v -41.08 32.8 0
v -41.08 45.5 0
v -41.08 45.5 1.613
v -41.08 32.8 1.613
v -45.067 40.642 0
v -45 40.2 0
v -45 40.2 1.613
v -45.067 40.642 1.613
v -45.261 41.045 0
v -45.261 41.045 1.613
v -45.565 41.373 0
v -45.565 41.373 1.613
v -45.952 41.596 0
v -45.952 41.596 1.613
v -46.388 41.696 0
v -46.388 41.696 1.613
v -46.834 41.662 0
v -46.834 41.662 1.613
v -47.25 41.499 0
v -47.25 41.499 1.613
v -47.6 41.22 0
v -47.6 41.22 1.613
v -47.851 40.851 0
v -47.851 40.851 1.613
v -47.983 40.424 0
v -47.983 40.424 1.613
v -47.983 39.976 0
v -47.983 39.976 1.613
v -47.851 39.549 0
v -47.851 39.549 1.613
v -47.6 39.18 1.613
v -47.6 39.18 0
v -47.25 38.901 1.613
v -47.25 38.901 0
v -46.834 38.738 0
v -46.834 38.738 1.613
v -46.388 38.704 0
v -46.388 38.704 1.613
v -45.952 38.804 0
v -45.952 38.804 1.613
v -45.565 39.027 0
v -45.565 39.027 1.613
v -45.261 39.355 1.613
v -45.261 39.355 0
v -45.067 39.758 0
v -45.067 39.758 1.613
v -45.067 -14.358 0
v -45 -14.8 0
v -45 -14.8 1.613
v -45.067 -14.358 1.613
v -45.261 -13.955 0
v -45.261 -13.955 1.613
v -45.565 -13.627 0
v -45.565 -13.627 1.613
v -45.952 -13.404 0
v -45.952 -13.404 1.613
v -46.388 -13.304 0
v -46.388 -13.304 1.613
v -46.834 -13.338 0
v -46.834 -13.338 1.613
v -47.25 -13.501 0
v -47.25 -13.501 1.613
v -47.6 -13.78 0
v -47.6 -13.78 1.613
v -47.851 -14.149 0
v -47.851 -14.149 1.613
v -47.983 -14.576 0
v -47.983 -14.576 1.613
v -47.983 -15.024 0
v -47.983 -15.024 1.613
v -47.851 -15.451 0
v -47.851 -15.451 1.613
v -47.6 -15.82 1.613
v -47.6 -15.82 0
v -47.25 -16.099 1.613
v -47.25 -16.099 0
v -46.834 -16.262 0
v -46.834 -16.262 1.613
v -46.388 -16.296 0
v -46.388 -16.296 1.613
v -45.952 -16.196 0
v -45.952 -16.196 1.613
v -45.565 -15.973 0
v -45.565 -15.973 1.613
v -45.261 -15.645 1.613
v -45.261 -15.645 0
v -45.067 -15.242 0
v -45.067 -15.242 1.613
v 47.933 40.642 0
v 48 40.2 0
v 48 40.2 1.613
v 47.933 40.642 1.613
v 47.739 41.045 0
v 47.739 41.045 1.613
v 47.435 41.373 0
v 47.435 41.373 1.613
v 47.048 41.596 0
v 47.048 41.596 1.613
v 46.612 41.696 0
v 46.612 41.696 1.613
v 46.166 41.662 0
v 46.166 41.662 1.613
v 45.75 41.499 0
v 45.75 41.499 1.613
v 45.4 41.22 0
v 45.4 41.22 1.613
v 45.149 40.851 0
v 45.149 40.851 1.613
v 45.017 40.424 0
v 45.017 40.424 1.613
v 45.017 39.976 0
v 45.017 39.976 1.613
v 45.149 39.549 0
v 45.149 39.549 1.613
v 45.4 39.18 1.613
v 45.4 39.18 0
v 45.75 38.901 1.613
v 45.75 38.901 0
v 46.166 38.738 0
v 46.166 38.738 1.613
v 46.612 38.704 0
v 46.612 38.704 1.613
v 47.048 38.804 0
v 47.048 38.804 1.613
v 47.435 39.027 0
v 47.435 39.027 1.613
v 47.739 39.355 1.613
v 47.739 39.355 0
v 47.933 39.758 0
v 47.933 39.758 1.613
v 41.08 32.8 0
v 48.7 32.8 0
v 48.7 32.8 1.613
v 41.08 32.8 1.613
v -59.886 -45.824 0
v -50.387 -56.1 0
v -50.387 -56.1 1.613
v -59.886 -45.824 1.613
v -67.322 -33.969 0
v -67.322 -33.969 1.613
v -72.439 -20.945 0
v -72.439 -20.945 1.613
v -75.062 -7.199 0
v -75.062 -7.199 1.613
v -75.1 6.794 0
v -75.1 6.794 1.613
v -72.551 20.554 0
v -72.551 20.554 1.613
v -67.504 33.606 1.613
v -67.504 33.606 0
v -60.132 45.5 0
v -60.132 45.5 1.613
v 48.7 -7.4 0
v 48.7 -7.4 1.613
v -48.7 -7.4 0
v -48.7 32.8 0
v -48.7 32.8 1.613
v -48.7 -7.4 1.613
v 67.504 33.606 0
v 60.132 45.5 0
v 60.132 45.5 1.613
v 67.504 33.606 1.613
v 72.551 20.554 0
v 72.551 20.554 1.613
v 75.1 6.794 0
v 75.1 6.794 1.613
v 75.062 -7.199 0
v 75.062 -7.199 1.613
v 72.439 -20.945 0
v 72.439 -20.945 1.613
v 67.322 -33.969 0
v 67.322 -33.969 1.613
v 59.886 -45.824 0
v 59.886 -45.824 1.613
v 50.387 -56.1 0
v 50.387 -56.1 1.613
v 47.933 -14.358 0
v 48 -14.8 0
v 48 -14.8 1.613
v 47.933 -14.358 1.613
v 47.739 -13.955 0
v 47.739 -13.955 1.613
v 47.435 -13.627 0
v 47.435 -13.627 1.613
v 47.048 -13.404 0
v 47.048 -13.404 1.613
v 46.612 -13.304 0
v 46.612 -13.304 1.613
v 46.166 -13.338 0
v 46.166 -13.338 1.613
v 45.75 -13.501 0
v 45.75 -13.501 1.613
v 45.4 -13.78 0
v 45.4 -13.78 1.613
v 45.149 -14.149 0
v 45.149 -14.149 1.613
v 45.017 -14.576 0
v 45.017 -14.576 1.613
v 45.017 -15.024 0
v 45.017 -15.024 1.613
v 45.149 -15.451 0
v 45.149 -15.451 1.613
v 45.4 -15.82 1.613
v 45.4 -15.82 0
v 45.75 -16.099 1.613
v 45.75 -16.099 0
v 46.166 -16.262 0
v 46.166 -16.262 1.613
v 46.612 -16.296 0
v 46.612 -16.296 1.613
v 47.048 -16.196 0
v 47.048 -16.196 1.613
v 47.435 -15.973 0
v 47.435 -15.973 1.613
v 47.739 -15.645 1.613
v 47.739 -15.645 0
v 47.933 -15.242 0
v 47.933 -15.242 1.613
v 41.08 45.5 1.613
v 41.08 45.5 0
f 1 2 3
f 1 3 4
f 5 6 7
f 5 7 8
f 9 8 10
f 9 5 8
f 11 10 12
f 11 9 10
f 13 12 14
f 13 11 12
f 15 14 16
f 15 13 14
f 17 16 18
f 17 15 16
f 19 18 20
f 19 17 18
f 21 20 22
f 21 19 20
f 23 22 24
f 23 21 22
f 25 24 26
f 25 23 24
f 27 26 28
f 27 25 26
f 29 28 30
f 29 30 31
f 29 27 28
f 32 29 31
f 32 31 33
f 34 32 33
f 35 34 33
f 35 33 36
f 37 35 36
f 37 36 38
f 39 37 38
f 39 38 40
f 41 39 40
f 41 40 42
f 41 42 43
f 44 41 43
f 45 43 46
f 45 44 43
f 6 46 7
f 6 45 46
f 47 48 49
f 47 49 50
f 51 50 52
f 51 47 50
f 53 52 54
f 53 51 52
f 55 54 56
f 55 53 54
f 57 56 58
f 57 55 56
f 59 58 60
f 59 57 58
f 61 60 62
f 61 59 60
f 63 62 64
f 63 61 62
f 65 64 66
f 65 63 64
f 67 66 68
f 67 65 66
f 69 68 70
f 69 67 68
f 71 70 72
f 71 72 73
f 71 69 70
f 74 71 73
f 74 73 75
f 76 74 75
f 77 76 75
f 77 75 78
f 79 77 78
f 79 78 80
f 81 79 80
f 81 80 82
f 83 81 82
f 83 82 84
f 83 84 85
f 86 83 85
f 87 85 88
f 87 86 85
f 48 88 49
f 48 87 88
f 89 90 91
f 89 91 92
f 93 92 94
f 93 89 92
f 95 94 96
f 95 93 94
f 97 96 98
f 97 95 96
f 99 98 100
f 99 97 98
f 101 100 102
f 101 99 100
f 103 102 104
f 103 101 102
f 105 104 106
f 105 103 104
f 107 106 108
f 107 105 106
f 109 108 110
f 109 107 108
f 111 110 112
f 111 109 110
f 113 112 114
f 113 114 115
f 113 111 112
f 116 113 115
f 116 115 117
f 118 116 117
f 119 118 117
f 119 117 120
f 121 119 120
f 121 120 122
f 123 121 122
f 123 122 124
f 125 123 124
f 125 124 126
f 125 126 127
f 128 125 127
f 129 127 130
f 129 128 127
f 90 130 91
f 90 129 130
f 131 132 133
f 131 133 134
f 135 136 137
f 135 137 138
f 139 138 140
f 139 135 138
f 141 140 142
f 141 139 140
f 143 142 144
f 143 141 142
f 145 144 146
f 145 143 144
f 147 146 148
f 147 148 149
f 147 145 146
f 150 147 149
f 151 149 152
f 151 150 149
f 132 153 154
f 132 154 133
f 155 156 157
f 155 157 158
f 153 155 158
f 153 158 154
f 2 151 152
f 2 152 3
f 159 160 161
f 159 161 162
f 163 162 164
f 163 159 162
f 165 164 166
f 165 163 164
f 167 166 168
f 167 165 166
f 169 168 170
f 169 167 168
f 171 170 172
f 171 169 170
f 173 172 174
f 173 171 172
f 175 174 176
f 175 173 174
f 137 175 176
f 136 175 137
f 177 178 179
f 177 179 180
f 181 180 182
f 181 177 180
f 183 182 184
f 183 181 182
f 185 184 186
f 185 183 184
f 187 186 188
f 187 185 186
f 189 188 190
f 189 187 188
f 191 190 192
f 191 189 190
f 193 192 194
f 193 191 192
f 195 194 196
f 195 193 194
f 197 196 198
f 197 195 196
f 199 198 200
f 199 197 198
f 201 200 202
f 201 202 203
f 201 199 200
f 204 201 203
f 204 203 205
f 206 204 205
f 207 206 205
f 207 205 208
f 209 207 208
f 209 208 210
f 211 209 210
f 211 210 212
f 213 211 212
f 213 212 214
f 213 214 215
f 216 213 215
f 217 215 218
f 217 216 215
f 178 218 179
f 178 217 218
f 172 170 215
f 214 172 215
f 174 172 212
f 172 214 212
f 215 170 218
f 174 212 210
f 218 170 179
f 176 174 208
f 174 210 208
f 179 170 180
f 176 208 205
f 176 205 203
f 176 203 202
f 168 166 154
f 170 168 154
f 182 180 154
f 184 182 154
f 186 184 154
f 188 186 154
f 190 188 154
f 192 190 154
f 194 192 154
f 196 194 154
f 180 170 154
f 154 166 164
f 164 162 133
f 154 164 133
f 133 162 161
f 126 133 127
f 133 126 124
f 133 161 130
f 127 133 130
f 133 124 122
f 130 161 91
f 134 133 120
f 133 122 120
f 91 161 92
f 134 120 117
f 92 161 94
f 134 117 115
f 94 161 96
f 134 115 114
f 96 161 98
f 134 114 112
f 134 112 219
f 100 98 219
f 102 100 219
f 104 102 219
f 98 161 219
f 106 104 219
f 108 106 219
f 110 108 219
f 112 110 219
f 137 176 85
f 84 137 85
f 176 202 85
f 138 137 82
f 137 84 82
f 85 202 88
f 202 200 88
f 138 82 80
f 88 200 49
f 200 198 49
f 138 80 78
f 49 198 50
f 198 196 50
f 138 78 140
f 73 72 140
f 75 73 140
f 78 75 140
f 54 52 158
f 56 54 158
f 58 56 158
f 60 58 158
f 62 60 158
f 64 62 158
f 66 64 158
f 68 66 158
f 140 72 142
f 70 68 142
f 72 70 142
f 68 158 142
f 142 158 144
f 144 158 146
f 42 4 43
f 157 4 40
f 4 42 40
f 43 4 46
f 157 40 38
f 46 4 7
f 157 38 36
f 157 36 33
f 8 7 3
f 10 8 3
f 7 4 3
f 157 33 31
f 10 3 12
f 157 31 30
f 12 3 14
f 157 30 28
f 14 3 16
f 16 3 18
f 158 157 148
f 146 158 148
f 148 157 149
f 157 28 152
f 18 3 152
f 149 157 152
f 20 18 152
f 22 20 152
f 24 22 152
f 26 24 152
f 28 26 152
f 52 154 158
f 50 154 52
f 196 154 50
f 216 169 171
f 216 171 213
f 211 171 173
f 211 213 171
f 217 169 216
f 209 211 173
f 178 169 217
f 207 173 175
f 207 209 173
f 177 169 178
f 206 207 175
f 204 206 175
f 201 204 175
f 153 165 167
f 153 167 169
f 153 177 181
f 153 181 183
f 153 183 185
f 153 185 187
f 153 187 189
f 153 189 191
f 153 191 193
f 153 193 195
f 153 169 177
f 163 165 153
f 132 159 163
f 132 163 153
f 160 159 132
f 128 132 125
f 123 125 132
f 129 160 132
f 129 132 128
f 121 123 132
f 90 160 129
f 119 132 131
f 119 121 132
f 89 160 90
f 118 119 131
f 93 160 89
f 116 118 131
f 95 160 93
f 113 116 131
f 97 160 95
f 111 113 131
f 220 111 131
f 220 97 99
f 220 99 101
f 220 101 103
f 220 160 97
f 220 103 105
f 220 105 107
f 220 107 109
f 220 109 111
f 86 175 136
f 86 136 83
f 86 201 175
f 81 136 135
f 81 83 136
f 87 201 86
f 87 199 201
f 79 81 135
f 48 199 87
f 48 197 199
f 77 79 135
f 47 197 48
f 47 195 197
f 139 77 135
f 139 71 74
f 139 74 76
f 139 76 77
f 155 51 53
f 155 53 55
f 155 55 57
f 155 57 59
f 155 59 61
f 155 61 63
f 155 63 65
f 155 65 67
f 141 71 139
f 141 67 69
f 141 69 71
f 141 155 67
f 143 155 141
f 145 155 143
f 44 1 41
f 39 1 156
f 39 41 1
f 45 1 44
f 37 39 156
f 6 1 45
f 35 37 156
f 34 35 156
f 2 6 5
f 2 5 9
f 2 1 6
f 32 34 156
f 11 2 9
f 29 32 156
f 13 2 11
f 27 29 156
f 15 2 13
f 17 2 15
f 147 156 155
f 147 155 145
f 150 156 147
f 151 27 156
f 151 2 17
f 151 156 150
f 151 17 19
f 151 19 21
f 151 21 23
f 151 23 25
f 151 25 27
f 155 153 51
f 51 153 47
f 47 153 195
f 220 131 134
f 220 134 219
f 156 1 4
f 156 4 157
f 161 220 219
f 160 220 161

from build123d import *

# Parameters (mm, degrees)
SKETCH1_R           = 1.5
BOSS_EXTRUDE1_DEPTH = 1.6129


with BuildPart() as part:
    # Sketch1 → Boss-Extrude1 (new body)
    with BuildSketch(Plane.XY):
        with BuildLine():
            Line((48.7, 32.8), (41.08, 32.8))
            Line((41.08, 32.8), (41.08, 45.5))
            Line((41.08, 45.5), (60.131959382, 45.5))
            ThreePointArc((60.131959382, 45.5), (75.061798197, -7.199235406), (50.387424414, -56.1))
            Line((50.387424414, -56.1), (-50.387424414, -56.1))
            ThreePointArc((-50.387424414, -56.1), (-75.061798197, -7.199235406), (-60.131959382, 45.5))
            Line((-60.131959382, 45.5), (-41.08, 45.5))
            Line((-41.08, 45.5), (-41.08, 32.8))
            Line((-41.08, 32.8), (-48.7, 32.8))
            Line((-48.7, 32.8), (-48.7, -7.4))
            Line((-48.7, -7.4), (48.7, -7.4))
            Line((48.7, -7.4), (48.7, 32.8))
        make_face()
        with Locations((-46.5, 40.199999991)):
            Circle(SKETCH1_R, mode=Mode.SUBTRACT)
        with Locations((46.5, 40.199999991)):
            Circle(SKETCH1_R, mode=Mode.SUBTRACT)
        with Locations((46.5, -14.799999991)):
            Circle(SKETCH1_R, mode=Mode.SUBTRACT)
        with Locations((-46.5, -14.799999991)):
            Circle(SKETCH1_R, mode=Mode.SUBTRACT)
    extrude(amount=BOSS_EXTRUDE1_DEPTH)


solid = part.part
